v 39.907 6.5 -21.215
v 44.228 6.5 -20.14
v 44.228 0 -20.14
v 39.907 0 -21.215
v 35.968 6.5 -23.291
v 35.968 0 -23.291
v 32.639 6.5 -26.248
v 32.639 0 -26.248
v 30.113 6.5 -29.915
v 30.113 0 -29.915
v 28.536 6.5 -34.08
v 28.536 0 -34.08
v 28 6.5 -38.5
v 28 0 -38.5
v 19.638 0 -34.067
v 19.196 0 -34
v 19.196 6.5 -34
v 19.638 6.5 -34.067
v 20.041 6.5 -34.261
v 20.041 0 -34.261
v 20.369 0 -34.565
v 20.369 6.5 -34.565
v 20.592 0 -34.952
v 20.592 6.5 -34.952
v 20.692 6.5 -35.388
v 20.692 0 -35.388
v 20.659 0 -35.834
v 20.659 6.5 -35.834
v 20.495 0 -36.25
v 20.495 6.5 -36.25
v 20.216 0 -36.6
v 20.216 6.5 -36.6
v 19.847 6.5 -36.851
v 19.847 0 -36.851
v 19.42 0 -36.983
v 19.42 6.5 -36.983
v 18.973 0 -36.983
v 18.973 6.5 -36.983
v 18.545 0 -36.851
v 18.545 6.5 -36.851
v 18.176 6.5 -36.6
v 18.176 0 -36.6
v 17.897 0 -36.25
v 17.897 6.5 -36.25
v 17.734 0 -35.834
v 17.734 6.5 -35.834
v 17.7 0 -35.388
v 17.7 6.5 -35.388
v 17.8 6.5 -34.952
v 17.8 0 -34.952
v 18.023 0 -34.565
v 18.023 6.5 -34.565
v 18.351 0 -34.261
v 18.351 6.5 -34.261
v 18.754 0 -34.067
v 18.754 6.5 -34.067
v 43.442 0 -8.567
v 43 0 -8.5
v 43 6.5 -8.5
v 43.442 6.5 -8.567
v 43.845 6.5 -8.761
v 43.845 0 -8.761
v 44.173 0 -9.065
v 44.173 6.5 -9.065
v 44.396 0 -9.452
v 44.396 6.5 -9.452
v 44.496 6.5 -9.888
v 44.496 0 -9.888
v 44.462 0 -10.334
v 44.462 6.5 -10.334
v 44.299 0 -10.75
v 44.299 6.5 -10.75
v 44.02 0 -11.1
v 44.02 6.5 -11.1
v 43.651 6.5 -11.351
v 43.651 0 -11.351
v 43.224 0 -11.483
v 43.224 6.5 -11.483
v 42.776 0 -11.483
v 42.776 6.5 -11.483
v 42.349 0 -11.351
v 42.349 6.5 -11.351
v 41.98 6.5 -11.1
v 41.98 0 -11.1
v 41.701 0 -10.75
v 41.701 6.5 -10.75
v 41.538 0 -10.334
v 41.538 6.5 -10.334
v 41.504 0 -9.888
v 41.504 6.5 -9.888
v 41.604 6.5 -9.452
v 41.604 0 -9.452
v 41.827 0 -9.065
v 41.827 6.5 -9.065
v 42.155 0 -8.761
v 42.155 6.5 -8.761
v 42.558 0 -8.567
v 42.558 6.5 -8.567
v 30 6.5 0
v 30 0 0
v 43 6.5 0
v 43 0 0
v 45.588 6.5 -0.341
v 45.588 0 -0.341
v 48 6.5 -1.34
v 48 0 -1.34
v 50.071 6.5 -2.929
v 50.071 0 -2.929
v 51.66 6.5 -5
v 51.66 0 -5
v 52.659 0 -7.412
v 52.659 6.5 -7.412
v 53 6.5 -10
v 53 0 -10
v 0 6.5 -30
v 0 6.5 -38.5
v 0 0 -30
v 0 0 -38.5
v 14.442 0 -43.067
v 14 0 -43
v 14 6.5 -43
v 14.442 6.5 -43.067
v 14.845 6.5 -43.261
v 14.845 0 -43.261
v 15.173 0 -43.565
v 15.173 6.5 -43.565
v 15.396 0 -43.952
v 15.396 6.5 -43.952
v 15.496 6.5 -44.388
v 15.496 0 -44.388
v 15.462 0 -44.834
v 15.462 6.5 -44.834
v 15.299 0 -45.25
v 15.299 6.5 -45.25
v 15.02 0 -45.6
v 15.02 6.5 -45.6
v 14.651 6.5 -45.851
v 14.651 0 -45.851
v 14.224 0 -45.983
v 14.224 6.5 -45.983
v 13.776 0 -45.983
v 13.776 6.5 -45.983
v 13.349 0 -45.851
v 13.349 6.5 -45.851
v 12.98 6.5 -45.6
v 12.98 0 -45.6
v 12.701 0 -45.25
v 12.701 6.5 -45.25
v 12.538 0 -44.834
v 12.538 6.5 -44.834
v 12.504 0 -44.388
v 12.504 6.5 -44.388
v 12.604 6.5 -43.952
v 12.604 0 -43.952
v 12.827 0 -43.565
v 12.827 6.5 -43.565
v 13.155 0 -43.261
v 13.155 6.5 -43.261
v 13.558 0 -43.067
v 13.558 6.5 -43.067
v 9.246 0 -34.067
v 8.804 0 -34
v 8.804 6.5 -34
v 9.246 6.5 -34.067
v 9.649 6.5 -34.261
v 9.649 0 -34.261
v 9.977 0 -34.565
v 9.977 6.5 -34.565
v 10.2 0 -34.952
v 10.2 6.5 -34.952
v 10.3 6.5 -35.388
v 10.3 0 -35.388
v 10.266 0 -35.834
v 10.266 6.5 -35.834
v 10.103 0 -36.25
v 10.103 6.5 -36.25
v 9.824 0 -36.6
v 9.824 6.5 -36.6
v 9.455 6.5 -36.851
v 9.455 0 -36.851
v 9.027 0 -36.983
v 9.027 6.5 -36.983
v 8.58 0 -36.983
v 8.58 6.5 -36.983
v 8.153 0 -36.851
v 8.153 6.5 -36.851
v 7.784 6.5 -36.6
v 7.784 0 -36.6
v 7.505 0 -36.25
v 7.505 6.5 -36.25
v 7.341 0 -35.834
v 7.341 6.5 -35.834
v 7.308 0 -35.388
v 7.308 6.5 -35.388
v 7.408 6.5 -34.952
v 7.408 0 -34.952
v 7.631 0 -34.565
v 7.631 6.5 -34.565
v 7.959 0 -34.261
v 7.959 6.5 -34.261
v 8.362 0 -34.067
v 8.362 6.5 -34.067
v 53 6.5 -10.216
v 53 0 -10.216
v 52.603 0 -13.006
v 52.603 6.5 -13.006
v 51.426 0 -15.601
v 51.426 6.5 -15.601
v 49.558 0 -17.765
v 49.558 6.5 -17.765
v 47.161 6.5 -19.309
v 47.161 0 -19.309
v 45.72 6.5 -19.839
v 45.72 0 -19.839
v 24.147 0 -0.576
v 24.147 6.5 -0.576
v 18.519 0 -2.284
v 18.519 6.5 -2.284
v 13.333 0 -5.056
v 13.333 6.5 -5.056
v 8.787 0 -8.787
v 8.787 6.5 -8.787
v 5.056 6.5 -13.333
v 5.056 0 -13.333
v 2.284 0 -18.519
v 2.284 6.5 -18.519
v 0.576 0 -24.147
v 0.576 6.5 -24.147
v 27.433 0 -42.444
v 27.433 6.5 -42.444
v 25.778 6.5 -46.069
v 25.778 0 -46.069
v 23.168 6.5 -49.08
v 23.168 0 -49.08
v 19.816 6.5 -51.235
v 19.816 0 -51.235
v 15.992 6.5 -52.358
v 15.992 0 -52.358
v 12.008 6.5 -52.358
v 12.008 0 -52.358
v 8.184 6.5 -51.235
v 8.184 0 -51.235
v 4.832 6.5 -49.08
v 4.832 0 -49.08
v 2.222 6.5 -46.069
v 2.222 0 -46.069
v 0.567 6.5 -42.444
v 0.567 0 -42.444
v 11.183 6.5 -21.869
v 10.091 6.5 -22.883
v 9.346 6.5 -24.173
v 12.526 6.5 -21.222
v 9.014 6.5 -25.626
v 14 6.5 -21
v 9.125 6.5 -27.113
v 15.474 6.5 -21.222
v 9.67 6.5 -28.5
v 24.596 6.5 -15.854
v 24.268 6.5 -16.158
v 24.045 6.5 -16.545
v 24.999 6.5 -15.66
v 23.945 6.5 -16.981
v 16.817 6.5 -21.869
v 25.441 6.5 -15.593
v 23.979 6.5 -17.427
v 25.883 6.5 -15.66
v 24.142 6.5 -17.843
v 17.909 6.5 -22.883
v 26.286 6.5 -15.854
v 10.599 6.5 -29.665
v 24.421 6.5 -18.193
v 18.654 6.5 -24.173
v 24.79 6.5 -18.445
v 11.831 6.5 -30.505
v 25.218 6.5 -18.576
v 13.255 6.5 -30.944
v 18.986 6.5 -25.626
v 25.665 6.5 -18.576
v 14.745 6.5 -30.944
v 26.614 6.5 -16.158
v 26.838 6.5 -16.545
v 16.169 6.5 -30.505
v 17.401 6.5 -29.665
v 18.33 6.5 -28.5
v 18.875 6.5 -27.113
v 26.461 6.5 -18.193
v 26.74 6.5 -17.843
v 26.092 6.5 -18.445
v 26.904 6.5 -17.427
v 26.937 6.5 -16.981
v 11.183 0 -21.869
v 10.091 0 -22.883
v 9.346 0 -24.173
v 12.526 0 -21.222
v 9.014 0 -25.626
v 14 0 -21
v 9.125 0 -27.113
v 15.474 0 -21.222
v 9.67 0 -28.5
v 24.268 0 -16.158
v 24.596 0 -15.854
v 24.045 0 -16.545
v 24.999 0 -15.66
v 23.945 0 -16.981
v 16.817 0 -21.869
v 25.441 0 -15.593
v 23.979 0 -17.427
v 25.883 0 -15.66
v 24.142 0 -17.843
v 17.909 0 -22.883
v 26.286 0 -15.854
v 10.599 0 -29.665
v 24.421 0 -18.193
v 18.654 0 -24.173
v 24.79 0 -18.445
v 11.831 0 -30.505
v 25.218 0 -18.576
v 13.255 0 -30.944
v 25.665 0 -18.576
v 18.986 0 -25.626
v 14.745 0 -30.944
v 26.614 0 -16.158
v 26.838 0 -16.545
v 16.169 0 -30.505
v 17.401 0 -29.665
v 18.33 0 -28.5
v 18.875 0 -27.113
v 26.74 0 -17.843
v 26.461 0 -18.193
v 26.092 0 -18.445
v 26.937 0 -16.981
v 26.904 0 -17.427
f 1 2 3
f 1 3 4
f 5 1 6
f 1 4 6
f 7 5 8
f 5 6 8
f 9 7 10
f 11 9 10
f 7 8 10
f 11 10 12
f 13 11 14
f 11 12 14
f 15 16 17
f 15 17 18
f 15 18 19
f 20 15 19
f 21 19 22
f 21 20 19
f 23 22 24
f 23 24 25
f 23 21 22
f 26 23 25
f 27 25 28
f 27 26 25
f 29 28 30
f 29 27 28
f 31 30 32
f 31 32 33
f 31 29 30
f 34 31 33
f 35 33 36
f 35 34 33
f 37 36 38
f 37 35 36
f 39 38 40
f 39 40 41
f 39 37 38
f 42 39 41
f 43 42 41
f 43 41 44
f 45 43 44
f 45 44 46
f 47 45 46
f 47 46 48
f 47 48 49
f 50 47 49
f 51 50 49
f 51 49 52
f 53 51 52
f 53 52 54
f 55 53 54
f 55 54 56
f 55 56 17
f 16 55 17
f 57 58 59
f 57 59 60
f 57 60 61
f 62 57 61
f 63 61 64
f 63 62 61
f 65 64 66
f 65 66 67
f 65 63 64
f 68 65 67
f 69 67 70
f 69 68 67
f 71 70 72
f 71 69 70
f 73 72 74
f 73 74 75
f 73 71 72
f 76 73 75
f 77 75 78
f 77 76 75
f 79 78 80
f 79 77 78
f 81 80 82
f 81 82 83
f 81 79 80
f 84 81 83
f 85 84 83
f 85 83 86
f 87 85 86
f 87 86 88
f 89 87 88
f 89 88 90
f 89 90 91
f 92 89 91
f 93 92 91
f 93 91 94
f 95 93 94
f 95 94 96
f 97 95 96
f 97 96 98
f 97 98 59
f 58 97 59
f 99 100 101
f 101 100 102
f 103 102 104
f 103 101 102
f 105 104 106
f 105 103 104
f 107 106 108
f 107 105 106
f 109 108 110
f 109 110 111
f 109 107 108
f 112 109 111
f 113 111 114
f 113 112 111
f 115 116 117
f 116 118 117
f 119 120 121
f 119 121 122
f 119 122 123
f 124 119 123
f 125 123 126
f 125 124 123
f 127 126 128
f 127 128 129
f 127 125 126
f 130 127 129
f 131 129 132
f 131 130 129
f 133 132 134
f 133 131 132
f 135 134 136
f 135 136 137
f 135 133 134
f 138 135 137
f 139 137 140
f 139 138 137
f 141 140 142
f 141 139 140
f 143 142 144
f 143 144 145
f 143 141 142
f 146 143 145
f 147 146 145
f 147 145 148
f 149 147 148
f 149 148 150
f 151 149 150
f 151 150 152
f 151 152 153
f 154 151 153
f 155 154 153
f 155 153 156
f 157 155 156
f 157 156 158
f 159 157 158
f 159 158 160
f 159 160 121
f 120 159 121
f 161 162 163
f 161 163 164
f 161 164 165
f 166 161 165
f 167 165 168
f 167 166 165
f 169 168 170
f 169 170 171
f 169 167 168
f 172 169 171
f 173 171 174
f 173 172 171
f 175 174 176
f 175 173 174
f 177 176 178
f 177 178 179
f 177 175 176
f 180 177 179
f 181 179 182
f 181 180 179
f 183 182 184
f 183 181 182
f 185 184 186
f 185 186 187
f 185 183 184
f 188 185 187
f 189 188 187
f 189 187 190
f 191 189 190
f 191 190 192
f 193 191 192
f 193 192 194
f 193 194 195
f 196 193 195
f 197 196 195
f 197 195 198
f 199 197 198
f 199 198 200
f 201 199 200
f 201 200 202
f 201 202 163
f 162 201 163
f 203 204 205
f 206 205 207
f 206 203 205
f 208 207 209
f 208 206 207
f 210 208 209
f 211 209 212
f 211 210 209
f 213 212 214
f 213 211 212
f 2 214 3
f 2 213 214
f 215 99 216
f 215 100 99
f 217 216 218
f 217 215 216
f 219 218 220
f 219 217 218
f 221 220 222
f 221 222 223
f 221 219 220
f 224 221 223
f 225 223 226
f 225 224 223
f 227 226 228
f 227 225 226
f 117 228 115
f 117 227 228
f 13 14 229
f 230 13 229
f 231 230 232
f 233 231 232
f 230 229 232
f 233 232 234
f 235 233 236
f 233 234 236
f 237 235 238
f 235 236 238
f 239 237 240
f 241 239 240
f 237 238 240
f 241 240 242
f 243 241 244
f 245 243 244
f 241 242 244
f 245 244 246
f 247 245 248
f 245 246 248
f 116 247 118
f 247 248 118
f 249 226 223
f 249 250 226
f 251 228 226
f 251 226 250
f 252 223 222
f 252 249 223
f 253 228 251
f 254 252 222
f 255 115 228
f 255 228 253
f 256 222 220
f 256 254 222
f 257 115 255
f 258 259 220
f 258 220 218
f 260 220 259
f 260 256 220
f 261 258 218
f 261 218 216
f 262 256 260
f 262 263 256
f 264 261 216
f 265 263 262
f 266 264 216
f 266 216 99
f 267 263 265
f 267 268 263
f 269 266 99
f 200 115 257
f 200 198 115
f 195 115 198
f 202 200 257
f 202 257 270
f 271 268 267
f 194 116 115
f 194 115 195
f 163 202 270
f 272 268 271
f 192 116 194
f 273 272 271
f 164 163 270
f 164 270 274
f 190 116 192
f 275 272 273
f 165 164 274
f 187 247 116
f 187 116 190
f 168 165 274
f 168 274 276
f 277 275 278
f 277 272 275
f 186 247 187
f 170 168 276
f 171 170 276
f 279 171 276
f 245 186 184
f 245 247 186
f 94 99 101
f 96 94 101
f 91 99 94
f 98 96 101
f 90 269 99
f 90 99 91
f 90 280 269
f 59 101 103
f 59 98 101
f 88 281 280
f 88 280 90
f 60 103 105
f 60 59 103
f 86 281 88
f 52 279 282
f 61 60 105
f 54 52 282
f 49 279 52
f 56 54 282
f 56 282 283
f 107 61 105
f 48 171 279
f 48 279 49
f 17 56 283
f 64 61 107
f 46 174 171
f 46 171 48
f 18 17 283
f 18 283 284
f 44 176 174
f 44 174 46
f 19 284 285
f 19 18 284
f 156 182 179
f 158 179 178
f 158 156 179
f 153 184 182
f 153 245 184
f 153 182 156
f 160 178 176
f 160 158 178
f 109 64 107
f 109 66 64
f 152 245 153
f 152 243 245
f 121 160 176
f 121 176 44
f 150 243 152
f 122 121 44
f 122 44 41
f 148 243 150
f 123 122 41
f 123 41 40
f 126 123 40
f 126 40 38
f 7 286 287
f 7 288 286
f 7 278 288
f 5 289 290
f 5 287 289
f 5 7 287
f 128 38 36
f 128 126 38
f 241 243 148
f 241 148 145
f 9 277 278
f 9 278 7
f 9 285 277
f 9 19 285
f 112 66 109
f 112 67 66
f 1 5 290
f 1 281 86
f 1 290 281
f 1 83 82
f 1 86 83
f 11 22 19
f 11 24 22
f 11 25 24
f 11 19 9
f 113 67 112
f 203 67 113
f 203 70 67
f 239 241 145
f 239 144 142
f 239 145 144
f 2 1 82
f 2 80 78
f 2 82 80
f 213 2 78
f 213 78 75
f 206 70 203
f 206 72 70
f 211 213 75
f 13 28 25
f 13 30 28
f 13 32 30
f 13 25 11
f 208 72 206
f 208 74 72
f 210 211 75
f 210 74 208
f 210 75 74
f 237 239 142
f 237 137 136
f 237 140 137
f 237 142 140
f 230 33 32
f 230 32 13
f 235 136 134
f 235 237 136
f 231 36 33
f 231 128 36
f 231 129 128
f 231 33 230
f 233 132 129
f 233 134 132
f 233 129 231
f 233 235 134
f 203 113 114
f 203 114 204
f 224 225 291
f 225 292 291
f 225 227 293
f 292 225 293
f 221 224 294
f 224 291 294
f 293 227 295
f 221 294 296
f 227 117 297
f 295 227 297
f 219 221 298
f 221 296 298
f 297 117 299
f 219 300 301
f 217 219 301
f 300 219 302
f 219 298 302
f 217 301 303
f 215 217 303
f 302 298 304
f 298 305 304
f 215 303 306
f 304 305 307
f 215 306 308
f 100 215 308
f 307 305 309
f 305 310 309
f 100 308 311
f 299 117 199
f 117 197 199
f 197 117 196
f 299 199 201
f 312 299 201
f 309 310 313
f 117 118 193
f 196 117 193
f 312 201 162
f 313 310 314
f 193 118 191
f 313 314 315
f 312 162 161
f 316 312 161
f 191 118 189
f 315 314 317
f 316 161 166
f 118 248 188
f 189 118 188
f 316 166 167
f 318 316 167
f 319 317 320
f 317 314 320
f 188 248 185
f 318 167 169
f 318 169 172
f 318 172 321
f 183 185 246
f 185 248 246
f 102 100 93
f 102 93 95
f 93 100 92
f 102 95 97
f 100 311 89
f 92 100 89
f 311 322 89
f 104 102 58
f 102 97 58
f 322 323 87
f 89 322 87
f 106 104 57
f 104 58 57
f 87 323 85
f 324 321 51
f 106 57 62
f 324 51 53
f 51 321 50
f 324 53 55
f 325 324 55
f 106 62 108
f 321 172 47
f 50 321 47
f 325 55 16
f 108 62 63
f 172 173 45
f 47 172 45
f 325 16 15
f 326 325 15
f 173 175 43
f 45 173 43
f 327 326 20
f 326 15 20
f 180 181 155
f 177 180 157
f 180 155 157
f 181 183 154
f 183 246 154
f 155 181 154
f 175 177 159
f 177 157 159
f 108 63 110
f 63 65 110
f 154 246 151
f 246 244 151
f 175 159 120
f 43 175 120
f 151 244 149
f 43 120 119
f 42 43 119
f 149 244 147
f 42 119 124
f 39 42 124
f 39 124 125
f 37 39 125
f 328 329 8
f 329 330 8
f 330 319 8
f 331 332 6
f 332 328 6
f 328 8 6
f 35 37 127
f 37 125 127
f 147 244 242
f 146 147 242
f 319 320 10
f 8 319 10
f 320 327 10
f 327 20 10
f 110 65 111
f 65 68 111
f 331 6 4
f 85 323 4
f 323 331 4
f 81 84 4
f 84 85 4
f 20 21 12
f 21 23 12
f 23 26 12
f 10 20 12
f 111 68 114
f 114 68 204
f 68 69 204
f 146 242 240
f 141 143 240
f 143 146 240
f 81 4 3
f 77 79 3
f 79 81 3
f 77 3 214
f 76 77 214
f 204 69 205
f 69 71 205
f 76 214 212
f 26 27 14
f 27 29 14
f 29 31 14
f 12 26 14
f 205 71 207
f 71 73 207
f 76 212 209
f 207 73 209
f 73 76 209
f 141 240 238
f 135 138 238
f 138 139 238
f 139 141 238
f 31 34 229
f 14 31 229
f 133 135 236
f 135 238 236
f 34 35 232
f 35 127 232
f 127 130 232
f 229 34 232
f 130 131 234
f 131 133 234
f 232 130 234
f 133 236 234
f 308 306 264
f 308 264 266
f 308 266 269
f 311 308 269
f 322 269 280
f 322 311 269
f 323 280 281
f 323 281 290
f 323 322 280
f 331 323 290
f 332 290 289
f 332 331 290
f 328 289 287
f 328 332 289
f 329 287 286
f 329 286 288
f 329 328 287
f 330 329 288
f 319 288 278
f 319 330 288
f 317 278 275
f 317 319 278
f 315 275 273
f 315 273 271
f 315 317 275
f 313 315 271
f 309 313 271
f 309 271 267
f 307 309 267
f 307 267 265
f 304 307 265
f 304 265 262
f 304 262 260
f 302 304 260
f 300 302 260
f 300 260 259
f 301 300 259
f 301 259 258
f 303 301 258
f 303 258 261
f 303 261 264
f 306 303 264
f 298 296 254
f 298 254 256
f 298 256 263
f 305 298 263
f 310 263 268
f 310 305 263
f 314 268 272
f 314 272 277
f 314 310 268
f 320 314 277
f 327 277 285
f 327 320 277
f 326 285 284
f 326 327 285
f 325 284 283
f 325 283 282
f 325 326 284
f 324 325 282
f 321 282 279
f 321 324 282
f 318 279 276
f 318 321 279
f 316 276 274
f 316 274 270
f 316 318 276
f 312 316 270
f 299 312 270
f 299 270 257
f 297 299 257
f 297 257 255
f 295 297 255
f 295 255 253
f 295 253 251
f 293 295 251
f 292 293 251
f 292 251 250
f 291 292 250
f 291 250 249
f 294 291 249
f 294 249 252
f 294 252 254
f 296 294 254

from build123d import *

# Parameters (mm, degrees)
SKETCH_1_R      = 1.5
SKETCH_1_R_2    = 5
EXTRUDE_1_DEPTH = 3.5
SKETCH_1_2_R    = 1.5
SKETCH_1_2_R_2  = 5
EXTRUDE_2_DEPTH = 6.5
FILLET_3_R      = 10
FILLET_4_R      = 10
FILLET_5_R      = 30


with BuildPart() as part:
    # 草图1 → 凸台-拉伸1 (new body)
    with BuildSketch(Plane(origin=(0, 0, 0), x_dir=(1, 0, 0), z_dir=(0, 1, 0))):
        with BuildLine():
            Line((0, 0), (53, 0))
            Line((53, 0), (53, 20))
            Line((53, 20), (46.5, 20))
            ThreePointArc((46.5, 20), (33.418524548, 25.418524548), (28, 38.5))
            ThreePointArc((28, 38.5), (14, 52.5), (0, 38.5))
            Line((0, 38.5), (0, 0))
        make_face()
        with Locations((14, 44.5)):
            Circle(SKETCH_1_R, mode=Mode.SUBTRACT)
        with Locations((19.196152423, 35.5)):
            Circle(SKETCH_1_R, mode=Mode.SUBTRACT)
        with Locations((43, 10)):
            Circle(SKETCH_1_R, mode=Mode.SUBTRACT)
        with Locations((14, 26)):
            Circle(SKETCH_1_R_2, mode=Mode.SUBTRACT)
        with Locations((8.803847577, 35.5)):
            Circle(SKETCH_1_R, mode=Mode.SUBTRACT)
        with Locations((25.441221962, 17.093145751)):
            Circle(SKETCH_1_R, mode=Mode.SUBTRACT)
    extrude(amount=EXTRUDE_1_DEPTH)

    # 草图1<2> → 凸台-拉伸2 (add)
    with BuildSketch(Plane(origin=(0, 0, 0), x_dir=(1, 0, 0), z_dir=(0, 1, 0))):
        with BuildLine():
            Line((0, 0), (53, 0))
            Line((53, 0), (53, 20))
            Line((53, 20), (46.5, 20))
            ThreePointArc((46.5, 20), (33.418524548, 25.418524548), (28, 38.5))
            ThreePointArc((28, 38.5), (14, 52.5), (0, 38.5))
            Line((0, 38.5), (0, 0))
        make_face()
        with Locations((14, 44.5)):
            Circle(SKETCH_1_2_R, mode=Mode.SUBTRACT)
        with Locations((19.196152423, 35.5)):
            Circle(SKETCH_1_2_R, mode=Mode.SUBTRACT)
        with Locations((43, 10)):
            Circle(SKETCH_1_2_R, mode=Mode.SUBTRACT)
        with Locations((14, 26)):
            Circle(SKETCH_1_2_R_2, mode=Mode.SUBTRACT)
        with Locations((8.803847577, 35.5)):
            Circle(SKETCH_1_2_R, mode=Mode.SUBTRACT)
        with Locations((25.441221962, 17.093145751)):
            Circle(SKETCH_1_2_R, mode=Mode.SUBTRACT)
    extrude(amount=EXTRUDE_2_DEPTH)

    # 圆角3
    fillet_3_edges = [part.edges().sort_by_distance(p)[0] for p in [
        (53, 3.25, 0),
    ]]
    fillet(fillet_3_edges, radius=FILLET_3_R)

    # 圆角4
    fillet_4_edges = [part.edges().sort_by_distance(p)[0] for p in [
        (53, 3.25, -20),
    ]]
    fillet(fillet_4_edges, radius=FILLET_4_R)

    # 圆角5
    fillet_5_edges = [part.edges().sort_by_distance(p)[0] for p in [
        (0, 3.25, 0),
    ]]
    fillet(fillet_5_edges, radius=FILLET_5_R)


solid = part.part
